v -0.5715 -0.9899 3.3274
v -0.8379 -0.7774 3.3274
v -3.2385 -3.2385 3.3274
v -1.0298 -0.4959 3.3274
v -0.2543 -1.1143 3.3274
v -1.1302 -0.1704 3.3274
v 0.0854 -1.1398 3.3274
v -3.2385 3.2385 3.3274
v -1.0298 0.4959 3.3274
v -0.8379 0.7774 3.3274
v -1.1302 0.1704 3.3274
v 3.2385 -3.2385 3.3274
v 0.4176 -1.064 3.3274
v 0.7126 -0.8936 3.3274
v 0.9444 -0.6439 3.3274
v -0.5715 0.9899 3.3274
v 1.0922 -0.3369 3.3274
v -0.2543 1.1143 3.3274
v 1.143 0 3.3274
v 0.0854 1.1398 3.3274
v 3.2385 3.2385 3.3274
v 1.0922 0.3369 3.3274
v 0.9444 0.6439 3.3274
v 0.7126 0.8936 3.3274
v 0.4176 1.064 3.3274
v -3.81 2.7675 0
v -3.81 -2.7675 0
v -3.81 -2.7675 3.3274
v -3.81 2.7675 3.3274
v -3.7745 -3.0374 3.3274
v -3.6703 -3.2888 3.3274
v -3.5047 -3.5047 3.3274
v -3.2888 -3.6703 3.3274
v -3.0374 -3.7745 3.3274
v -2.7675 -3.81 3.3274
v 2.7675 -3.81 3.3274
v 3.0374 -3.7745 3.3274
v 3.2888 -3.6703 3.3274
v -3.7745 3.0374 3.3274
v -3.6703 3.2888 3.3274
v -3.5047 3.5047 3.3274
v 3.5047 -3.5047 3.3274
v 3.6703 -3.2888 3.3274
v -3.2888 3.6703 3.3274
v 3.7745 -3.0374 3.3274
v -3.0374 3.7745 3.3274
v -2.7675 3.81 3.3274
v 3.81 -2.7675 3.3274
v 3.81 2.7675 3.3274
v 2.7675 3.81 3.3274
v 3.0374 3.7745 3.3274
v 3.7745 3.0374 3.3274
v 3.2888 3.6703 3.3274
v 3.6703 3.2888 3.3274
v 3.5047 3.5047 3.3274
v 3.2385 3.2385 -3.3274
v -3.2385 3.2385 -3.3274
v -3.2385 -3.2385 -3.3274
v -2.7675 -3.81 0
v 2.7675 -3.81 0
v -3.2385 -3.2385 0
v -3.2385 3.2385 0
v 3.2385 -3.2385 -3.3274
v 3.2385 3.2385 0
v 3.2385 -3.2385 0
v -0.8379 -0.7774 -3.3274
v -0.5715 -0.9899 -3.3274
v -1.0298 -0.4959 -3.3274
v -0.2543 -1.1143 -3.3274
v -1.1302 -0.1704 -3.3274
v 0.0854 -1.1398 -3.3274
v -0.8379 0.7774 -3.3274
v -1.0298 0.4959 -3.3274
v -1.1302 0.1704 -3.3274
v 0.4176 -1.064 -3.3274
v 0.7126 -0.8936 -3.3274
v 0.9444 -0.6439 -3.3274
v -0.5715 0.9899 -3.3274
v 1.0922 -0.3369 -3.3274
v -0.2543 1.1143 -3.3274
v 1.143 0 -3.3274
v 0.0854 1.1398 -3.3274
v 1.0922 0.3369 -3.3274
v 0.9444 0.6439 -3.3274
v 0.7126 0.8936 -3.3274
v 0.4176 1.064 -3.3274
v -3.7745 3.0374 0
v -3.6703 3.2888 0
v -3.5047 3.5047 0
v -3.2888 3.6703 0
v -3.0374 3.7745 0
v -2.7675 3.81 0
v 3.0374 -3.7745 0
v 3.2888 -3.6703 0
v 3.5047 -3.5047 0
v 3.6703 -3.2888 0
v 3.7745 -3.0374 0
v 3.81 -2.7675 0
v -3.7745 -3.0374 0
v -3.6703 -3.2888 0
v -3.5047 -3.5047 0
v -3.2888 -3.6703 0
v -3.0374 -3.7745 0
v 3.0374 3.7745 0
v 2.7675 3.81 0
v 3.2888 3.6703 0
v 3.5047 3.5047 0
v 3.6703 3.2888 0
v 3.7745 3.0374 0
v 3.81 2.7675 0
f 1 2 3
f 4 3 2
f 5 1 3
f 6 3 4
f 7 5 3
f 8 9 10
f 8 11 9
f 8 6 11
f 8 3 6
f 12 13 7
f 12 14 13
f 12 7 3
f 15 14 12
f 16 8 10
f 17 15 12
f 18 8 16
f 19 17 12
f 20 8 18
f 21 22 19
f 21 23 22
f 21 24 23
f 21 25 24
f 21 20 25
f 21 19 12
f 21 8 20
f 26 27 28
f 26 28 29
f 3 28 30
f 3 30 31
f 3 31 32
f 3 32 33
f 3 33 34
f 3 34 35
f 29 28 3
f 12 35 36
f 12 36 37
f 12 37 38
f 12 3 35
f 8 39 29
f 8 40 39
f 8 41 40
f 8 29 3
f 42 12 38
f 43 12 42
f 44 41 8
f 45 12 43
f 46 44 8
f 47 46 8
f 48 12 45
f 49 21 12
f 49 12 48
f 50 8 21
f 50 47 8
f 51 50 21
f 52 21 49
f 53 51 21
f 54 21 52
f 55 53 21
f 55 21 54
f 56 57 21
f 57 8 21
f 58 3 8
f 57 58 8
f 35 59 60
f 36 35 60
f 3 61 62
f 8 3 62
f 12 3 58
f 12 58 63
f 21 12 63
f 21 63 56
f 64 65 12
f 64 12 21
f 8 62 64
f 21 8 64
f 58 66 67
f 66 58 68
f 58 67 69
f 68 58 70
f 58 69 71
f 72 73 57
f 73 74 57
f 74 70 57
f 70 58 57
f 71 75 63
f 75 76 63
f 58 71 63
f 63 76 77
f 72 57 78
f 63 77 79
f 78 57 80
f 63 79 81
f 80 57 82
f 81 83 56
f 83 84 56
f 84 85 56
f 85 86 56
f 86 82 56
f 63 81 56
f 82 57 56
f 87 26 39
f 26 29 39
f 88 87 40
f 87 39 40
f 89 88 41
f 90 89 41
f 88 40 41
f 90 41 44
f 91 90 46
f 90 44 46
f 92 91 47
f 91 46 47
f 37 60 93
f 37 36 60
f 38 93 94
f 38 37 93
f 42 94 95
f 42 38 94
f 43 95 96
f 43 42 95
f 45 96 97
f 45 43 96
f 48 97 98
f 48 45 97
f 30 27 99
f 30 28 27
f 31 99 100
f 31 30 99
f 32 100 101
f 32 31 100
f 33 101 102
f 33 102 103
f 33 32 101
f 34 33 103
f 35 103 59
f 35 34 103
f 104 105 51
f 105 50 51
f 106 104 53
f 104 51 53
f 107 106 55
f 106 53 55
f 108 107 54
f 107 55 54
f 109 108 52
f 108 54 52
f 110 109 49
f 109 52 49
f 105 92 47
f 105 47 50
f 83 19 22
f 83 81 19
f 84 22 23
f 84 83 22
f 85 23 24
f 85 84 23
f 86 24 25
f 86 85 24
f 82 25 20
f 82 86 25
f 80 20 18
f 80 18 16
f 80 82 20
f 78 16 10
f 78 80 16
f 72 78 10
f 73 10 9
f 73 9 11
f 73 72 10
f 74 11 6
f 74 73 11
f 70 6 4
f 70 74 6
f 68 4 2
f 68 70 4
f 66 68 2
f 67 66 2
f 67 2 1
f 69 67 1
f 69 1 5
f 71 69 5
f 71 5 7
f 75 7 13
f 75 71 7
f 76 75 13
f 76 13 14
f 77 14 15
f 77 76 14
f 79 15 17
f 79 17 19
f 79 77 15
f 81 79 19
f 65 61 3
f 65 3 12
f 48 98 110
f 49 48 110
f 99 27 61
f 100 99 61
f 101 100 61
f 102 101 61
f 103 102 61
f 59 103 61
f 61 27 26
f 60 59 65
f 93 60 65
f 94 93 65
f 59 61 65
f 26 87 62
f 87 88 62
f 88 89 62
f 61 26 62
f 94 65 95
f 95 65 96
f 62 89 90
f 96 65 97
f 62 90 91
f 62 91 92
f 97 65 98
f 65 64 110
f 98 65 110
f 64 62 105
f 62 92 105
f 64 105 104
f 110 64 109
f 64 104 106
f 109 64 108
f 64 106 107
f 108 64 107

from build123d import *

# Parameters (mm, degrees)
F0_W     = 6.477
F0_H     = 6.477
F0_R     = 1.143
F1_DEPTH = 3.3274
F0_W_2   = 7.62
F0_H_2   = 7.62
F2_DEPTH = 3.3274
F3_R     = 1.042457


with BuildPart() as f1:
    # F0 (on Top) → F1 (new body, symmetric)
    with BuildSketch(Plane.XY):
        Rectangle(F0_W, F0_H)
        Circle(F0_R, mode=Mode.SUBTRACT)
    extrude(amount=F1_DEPTH, both=True)


with BuildPart() as f2:
    # F0 (on Top) → F2 (new body)
    with BuildSketch(Plane.XY):
        Rectangle(F0_W_2, F0_H_2)
        Rectangle(F0_W, F0_H, mode=Mode.SUBTRACT)
    extrude(amount=F2_DEPTH)

    # F3
    f3_edges = [f2.edges().sort_by_distance(p)[0] for p in [
        (-3.81, 3.81, 1.6637),
        (-3.81, -3.81, 1.6637),
        (3.81, -3.81, 1.6637),
        (3.81, 3.81, 1.6637),
    ]]
    fillet(f3_edges, radius=F3_R)


solid = Compound([f1.part, f2.part])
